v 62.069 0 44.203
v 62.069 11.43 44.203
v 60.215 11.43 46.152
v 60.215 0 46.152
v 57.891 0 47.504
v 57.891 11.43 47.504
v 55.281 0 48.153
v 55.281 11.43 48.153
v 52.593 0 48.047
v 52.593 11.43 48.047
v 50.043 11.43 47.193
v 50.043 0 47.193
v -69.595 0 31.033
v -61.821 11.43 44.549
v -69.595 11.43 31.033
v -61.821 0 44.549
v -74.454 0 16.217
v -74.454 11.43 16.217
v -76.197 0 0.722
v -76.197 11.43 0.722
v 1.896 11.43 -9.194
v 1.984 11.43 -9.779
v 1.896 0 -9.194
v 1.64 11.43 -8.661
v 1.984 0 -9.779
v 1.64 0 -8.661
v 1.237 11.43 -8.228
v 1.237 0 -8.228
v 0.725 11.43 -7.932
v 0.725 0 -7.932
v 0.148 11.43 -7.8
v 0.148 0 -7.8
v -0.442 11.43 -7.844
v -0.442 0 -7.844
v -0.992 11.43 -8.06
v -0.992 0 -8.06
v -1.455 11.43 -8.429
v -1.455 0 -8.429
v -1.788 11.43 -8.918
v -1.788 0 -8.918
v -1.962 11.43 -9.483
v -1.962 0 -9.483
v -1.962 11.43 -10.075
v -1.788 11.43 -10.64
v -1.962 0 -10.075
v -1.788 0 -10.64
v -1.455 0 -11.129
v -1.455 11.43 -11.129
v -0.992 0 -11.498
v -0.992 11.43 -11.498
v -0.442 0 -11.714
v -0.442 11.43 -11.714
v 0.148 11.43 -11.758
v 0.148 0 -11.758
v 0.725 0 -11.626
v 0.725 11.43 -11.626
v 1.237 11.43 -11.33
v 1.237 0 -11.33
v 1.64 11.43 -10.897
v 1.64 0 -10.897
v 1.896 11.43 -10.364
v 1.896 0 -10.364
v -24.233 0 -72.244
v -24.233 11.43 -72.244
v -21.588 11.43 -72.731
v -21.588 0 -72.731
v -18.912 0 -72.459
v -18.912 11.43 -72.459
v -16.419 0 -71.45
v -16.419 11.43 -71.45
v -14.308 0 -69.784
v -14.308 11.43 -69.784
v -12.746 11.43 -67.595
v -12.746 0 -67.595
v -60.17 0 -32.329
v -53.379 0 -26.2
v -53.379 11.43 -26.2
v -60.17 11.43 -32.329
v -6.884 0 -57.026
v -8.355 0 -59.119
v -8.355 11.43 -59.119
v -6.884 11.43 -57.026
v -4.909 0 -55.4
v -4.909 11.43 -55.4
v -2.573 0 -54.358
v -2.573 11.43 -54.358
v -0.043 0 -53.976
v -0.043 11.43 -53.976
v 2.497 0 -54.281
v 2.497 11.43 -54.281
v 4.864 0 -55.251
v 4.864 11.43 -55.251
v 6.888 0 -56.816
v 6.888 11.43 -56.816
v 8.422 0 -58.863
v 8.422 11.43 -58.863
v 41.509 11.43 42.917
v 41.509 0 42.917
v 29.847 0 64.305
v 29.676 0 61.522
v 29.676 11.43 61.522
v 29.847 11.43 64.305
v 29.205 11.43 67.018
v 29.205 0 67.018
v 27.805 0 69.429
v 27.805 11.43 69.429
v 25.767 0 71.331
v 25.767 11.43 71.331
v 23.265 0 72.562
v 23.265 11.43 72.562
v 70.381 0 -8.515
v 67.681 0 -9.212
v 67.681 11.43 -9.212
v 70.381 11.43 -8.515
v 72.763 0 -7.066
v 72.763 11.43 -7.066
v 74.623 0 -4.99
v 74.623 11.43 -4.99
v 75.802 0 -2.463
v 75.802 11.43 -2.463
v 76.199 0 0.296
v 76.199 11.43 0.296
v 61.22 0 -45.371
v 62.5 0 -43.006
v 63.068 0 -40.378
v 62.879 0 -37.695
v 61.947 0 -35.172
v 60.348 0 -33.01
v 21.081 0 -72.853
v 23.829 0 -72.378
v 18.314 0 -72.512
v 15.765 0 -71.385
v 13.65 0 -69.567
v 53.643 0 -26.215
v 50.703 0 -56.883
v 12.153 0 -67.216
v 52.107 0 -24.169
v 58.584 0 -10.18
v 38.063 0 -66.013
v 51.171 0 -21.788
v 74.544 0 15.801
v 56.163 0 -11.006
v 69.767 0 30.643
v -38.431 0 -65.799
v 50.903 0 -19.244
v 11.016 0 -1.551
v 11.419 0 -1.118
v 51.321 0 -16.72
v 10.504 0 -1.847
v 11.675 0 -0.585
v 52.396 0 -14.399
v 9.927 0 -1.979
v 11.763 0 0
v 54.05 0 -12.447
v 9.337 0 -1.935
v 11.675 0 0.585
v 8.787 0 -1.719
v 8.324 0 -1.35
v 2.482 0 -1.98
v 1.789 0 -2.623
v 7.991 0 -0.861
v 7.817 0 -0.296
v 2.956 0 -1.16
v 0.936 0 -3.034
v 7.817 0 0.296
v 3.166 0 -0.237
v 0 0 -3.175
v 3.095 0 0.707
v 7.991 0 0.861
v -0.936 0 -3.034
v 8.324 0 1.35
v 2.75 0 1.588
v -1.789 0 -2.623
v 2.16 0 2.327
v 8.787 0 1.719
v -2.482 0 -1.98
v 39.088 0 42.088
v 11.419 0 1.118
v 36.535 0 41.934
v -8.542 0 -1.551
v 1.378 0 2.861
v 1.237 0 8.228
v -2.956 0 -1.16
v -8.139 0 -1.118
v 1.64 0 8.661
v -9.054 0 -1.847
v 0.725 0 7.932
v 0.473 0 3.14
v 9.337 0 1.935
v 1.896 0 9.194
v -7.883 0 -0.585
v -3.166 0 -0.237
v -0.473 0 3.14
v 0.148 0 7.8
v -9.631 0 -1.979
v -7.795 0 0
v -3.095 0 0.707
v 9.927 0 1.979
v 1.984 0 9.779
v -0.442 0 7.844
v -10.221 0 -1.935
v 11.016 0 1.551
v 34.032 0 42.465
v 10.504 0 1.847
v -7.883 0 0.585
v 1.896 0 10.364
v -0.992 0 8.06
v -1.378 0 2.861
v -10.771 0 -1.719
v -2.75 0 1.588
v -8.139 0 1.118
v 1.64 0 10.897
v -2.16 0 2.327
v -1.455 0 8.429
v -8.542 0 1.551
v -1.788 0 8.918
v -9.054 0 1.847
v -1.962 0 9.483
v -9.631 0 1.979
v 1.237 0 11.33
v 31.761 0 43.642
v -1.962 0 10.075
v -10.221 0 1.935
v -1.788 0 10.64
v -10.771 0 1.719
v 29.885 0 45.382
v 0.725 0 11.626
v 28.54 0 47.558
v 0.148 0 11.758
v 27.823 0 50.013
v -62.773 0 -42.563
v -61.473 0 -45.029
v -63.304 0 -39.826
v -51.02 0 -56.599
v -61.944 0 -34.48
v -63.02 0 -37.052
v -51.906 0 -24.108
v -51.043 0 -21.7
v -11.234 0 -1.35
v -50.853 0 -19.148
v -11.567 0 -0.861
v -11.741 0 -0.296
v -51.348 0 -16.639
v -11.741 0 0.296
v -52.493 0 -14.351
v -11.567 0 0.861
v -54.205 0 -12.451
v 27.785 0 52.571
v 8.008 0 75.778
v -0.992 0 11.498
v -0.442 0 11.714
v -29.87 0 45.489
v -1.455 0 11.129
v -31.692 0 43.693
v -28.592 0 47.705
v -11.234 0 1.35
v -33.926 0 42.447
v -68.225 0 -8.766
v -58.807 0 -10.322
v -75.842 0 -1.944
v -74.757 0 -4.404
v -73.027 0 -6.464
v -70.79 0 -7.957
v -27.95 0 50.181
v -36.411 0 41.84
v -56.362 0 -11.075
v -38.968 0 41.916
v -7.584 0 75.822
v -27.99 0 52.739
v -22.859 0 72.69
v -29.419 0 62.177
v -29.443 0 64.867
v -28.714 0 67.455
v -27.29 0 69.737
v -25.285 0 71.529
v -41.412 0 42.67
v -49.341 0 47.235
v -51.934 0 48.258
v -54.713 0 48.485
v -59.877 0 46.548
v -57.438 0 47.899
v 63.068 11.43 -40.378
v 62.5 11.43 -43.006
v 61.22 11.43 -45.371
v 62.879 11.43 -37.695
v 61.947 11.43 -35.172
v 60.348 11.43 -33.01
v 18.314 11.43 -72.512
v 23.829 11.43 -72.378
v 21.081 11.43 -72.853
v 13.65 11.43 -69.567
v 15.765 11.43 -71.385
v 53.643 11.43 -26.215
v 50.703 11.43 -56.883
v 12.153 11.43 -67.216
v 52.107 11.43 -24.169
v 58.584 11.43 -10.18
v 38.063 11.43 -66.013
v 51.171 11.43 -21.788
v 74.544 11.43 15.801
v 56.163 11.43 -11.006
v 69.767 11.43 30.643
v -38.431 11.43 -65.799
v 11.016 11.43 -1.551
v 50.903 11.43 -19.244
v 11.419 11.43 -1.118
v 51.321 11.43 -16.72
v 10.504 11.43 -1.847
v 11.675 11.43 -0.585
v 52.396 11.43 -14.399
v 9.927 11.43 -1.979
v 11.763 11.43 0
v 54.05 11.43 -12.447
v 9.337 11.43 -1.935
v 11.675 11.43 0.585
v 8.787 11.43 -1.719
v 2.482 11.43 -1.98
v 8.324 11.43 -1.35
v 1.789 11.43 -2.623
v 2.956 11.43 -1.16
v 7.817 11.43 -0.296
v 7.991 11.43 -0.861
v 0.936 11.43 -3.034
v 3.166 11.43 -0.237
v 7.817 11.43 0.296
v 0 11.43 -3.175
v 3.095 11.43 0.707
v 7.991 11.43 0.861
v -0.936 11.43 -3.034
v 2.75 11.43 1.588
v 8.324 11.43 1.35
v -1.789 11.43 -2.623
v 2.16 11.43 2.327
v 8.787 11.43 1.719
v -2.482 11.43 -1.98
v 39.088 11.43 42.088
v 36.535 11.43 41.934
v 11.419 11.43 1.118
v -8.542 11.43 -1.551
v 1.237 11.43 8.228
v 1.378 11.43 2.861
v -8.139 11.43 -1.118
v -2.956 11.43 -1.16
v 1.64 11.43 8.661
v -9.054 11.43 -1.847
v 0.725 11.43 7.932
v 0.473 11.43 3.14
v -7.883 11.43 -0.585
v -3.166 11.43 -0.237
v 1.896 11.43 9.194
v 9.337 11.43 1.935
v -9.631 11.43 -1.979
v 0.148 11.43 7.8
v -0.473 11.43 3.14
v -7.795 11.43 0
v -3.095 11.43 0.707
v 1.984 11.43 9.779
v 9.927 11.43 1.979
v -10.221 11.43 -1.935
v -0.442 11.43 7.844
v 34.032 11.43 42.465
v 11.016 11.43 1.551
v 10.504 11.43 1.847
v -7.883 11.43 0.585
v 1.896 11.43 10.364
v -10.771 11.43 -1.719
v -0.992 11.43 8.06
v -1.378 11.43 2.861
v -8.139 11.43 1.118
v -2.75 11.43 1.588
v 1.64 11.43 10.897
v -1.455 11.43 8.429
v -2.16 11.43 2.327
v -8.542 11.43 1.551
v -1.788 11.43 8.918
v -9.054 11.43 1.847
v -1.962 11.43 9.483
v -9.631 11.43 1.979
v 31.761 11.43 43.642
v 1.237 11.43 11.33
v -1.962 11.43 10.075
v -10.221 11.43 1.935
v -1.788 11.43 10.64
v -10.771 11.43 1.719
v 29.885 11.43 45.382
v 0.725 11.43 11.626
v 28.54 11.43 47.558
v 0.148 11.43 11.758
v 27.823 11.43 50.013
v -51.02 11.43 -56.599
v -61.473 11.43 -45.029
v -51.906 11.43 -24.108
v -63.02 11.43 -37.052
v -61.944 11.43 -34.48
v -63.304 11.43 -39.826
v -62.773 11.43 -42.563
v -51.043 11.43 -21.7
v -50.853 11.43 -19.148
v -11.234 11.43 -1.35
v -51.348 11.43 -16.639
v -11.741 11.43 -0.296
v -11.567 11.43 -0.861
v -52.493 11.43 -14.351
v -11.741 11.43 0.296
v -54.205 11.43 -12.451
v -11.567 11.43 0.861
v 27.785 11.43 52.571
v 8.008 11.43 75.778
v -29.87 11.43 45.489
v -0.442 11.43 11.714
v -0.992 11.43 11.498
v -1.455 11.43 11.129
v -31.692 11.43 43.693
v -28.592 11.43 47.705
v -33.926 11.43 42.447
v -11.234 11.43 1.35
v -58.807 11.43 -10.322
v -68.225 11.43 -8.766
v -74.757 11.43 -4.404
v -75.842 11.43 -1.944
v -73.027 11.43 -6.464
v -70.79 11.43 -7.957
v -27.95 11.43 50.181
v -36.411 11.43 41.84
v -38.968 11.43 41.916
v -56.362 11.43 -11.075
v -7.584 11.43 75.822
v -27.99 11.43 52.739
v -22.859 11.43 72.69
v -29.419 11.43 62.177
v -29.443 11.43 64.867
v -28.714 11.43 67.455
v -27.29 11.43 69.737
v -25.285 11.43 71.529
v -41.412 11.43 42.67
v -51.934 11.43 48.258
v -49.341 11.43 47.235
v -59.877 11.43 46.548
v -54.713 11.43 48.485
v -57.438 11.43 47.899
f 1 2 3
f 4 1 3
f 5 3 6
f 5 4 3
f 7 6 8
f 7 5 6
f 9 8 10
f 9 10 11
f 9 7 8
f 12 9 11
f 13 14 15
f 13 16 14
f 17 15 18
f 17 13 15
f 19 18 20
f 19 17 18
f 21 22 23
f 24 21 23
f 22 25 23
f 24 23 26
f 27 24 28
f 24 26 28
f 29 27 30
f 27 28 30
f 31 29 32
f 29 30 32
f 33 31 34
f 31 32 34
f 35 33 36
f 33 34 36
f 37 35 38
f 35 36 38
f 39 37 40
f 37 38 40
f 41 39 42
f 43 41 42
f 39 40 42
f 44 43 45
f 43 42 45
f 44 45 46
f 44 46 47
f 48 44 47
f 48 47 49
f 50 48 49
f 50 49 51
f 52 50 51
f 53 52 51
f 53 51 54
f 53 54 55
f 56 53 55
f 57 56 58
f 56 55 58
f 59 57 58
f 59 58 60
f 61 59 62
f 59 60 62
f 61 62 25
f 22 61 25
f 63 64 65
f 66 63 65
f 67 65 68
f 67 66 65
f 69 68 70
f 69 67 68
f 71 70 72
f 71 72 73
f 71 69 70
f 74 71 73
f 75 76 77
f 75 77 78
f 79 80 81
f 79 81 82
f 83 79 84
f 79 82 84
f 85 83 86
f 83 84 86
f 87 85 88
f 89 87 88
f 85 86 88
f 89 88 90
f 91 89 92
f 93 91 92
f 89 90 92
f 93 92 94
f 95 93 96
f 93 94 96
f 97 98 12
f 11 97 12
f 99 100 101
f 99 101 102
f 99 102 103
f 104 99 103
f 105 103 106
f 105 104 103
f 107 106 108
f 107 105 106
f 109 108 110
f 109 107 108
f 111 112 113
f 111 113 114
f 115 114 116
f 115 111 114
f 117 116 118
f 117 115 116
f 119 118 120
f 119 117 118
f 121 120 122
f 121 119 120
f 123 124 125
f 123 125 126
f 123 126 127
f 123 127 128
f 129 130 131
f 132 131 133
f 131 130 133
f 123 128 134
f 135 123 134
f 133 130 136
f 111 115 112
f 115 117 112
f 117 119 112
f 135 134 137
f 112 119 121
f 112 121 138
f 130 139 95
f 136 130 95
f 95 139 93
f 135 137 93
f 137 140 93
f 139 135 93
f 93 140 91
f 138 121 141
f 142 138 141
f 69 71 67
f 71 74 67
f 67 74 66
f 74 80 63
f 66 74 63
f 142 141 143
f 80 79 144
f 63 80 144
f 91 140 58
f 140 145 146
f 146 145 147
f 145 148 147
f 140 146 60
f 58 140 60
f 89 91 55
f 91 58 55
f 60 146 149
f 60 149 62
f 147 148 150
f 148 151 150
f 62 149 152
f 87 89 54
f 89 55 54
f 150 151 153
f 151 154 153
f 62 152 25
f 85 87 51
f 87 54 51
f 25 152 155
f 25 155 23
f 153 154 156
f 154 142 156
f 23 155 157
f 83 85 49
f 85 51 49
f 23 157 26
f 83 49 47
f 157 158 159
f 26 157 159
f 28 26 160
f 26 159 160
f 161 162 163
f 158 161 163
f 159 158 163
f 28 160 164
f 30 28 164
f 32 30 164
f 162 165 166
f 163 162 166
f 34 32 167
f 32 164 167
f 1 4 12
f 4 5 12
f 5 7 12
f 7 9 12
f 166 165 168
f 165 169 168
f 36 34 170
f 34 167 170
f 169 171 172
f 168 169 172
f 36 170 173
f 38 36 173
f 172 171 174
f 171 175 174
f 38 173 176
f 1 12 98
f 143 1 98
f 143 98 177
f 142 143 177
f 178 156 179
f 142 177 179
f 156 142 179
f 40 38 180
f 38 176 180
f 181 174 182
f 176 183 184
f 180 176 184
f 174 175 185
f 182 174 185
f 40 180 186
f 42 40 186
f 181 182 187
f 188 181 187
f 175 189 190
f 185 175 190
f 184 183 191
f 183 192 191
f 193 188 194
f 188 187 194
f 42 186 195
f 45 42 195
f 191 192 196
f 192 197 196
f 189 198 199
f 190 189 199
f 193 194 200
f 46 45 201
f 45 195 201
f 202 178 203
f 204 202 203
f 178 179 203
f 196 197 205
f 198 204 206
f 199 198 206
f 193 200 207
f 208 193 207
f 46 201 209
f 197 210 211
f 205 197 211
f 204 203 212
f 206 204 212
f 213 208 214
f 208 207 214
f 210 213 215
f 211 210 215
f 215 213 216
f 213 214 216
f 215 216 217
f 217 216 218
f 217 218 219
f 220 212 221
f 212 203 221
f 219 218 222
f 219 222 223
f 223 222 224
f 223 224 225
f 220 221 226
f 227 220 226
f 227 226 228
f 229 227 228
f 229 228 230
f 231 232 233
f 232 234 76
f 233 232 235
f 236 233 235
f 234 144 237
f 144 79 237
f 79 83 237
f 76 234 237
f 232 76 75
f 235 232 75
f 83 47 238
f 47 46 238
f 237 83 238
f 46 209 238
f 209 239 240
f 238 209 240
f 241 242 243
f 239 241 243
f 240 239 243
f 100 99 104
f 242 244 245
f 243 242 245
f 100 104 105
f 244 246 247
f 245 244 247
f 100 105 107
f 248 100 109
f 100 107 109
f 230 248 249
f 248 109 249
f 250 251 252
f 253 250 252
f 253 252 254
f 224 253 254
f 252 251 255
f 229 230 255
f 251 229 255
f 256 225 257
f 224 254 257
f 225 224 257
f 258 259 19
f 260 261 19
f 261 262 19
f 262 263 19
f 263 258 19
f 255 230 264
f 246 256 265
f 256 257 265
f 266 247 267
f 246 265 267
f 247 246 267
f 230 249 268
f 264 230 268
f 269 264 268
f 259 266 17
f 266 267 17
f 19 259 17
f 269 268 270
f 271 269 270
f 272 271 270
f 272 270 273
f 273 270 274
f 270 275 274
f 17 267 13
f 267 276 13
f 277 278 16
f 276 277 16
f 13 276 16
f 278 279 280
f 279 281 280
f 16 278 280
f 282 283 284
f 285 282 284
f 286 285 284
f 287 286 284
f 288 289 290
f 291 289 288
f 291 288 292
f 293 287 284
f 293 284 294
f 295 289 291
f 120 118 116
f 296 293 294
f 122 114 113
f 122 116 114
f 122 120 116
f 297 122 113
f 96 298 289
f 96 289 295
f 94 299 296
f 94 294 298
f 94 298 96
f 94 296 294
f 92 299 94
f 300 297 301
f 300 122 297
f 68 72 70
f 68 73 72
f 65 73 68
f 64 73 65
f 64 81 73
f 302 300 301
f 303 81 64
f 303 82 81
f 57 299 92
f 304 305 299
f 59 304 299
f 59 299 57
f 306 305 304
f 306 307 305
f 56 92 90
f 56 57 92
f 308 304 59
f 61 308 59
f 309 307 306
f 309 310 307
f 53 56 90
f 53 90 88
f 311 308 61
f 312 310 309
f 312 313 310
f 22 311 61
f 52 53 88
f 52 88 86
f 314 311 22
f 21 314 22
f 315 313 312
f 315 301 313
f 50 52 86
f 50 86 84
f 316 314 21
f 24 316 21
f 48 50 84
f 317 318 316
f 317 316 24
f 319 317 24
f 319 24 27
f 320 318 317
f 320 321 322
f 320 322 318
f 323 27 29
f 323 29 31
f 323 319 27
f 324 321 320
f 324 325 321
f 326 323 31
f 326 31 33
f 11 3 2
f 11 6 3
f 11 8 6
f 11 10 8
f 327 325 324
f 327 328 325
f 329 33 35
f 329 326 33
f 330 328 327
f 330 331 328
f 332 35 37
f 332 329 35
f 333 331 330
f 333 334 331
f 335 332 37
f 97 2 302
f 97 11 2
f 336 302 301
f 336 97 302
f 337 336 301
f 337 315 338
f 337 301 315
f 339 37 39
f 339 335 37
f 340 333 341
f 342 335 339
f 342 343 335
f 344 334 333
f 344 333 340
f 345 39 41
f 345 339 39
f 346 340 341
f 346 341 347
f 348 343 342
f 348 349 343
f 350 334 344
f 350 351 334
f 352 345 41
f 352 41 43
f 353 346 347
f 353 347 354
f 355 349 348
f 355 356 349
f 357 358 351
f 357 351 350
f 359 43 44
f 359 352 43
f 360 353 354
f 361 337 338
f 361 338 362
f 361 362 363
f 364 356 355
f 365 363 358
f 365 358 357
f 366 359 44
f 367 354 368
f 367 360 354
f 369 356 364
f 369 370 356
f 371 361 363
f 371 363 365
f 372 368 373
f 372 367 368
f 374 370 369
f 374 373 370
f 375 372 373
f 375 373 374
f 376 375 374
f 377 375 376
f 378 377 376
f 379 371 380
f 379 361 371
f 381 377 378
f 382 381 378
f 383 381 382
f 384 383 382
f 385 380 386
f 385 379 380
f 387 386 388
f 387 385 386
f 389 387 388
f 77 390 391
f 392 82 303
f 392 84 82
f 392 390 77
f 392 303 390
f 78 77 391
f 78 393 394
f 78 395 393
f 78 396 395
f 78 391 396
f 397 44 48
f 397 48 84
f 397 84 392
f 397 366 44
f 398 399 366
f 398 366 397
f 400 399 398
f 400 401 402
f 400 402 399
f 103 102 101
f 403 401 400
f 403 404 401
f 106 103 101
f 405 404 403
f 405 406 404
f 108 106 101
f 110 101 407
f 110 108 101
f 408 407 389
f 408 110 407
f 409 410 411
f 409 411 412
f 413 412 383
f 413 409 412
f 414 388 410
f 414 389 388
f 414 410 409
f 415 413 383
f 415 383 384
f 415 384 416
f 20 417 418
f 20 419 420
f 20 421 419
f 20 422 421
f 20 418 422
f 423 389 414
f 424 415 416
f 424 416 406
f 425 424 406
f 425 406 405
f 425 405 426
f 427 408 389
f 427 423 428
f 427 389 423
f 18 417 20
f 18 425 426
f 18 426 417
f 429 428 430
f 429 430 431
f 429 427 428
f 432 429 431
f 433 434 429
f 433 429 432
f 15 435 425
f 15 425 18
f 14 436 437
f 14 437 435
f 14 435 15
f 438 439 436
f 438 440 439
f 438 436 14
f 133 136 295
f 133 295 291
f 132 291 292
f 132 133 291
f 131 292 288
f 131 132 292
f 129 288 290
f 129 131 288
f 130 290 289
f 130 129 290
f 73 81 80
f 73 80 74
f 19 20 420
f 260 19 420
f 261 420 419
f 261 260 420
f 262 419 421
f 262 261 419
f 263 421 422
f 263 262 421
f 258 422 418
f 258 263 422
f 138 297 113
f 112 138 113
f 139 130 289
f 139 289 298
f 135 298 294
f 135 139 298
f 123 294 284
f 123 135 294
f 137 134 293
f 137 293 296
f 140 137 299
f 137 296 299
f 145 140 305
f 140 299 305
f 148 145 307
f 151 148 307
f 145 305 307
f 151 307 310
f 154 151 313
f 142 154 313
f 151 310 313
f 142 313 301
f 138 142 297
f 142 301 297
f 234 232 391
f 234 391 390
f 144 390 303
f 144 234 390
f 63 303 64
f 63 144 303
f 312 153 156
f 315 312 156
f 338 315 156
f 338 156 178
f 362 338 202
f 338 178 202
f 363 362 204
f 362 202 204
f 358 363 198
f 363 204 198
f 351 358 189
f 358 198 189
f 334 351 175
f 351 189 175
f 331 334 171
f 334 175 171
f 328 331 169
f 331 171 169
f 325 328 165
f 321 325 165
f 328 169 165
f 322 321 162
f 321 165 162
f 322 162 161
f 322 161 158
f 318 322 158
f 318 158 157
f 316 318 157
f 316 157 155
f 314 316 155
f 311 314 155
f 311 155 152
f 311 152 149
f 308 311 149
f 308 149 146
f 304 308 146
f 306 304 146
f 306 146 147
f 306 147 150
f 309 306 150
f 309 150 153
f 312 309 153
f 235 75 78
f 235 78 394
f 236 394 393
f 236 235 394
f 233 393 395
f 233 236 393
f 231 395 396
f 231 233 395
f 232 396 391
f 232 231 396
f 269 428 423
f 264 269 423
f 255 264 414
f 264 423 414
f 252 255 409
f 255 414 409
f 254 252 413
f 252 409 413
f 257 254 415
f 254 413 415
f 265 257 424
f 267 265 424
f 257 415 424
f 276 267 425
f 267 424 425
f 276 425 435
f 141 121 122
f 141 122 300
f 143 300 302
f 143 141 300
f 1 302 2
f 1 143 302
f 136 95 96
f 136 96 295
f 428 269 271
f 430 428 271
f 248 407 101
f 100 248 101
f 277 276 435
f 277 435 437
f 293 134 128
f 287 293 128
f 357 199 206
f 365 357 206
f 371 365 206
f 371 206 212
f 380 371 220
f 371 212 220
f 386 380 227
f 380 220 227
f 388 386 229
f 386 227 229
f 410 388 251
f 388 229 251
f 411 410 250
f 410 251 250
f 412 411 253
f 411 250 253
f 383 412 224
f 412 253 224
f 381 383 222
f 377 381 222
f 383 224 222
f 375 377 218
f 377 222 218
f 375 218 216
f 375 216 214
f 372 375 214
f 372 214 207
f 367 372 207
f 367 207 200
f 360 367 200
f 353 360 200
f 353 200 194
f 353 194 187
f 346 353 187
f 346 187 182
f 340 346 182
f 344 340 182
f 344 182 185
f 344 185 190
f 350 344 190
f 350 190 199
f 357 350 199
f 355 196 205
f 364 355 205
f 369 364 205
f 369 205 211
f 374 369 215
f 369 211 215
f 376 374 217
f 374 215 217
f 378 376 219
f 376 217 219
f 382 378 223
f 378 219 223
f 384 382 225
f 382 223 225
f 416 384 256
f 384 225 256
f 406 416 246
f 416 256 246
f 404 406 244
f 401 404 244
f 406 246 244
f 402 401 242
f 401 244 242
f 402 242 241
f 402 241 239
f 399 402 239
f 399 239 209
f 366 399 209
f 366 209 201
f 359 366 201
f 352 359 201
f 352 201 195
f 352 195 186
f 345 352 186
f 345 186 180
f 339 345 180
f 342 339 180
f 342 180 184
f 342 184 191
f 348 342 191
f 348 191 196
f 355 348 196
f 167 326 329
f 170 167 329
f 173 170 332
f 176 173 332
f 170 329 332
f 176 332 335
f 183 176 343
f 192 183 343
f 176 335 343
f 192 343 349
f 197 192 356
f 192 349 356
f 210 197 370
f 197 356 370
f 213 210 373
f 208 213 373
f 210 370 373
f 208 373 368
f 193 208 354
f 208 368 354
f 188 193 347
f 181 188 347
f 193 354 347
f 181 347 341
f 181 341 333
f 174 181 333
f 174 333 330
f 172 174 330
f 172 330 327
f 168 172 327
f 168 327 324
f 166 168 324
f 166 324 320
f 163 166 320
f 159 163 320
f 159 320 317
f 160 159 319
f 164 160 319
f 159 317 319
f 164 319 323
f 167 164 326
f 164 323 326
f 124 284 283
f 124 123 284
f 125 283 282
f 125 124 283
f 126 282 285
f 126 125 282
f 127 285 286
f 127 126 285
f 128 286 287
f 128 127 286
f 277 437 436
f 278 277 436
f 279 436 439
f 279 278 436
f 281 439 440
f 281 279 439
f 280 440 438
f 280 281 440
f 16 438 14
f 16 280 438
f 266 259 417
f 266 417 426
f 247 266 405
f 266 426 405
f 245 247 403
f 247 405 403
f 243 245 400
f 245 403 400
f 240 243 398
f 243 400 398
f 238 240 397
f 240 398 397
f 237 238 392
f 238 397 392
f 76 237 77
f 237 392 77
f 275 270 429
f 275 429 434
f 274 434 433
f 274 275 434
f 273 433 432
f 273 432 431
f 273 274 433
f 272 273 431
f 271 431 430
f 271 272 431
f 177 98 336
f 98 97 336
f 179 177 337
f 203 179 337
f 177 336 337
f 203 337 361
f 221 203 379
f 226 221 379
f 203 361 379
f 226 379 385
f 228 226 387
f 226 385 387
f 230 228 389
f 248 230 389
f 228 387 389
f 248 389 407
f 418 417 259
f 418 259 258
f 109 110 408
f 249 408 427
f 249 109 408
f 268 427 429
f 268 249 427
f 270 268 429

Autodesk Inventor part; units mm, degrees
ref_plane "YZ Plane" through (0, 0, 0) normal (1, 0, 0) x (0, 1, 0)
ref_plane "XZ Plane" through (0, 0, 0) normal (0, 1, 0) x (-1, 0, 0)
ref_plane "XY Plane" through (0, 0, 0) normal (0, 0, 1) x (1, 0, 0)
sketch "Sketch1" plane through (0, 0, 0) normal (0, 1, 0) x (-1, 0, 0)
  circle A0 centre (0, 0) radius 76.2
  dimension "d0" = 152.4
extrude "Extrusion1" add sketch "Sketch1" along normal blind 11.43
sketch "Sketch2" plane through (0, 11.43, 0) normal (0, 1, 0) x (1, 0, 0)
  circle A0 centre (0, 0) radius 76.2 projected
  line L0 (0.1023, 76.1999) -> (0.1023, 63.4999) construction
  arc A1 (-8.3552, 59.1187) -> (8.4222, 58.8626) centre (0.1023, 63.4999) ccw
  line L1 (8.4222, 58.8626) -> (15.4584, 74.6155)
  line L2 (-8.3552, 59.1187) -> (-16.2911, 74.4382)
  dimension "d3" = 12.7
  dimension "d4" = 19.05
  dimension "d16" = 31.75
extrude "Extrusion2" cut sketch "Sketch2" against normal through all contours L1 A1 L2 A0 picked at (1.6562, 64.6745)
fillet "Fillet1" radius 9.525 1 edges at (-16.2911, 5.715, -74.4382)
fillet "Fillet2" radius 9.525 1 edges at (15.4584, 5.715, -74.6155)
pattern_circular "Circular Pattern1" count 5 over 360 about axis through (0, -10, 0) along (0, 1, 0) of "Extrusion2", "Fillet1", "Fillet2"
sketch "Sketch4" plane through (0, 0, 0) normal (0, -1, 0) x (1, 0, 0)
  circle A0 centre (0, 0) radius 3.175
  dimension "d19" = 6.35
hole "Hole1" at (0, 0, 0) direction (0, 1, 0) diameter 6.35 end through all
sketch "Sketch5" plane through (0, 0, 0) normal (0, -1, 0) x (1, 0, 0)
  circle A0 centre (0, -9.779) radius 1.9844
  circle A1 centre (0, 0) radius 3.175 projected
  arc A2 (67.6814, -9.2124) -> (76.1994, 0.2962) centre (66.6745, 0.2592) ccw projected
  arc A3 (76.1994, 0.2962) -> (62.0688, 44.203) centre (0, 0) ccw projected
  arc A4 (62.0688, 44.203) -> (50.0431, 47.1934) centre (54.3102, 38.6777) ccw projected
  line L0 (50.0431, 47.1934) -> (41.5086, 42.9169) projected
  arc A5 (27.7848, 52.5712) -> (41.5086, 42.9169) centre (37.2415, 51.4327) ccw projected
  line L1 (27.7848, 52.5712) -> (29.6763, 61.522) projected
  arc A6 (29.6763, 61.522) -> (23.2652, 72.5615) centre (20.357, 63.4913) ccw projected
  arc A7 (23.2652, 72.5615) -> (-22.8593, 72.6904) centre (0, 0) ccw projected
  arc A8 (-22.8593, 72.6904) -> (-29.4194, 62.1774) centre (-20.0019, 63.6041) ccw projected
  line L2 (-29.4194, 62.1774) -> (-27.9896, 52.7391) projected
  arc A9 (-41.4122, 42.6704) -> (-27.9896, 52.7391) centre (-37.4071, 51.3124) ccw projected
  line L3 (-41.4122, 42.6704) -> (-49.3405, 47.2352) projected
  arc A10 (-49.3405, 47.2352) -> (-61.8207, 44.5493) centre (-54.0931, 38.9806) ccw projected
  arc A11 (-61.8207, 44.5493) -> (-76.1966, 0.7221) centre (0, 0) ccw projected
  arc A12 (-76.1966, 0.7221) -> (-68.2253, -8.7657) centre (-66.672, 0.6318) ccw projected
  line L4 (-68.2253, -8.7657) -> (-58.8071, -10.3224) projected
  arc A13 (-53.379, -26.1995) -> (-58.8071, -10.3224) centre (-60.3604, -19.7199) ccw projected
  line L5 (-53.379, -26.1995) -> (-60.1703, -32.3291) projected
  arc A14 (-60.1703, -32.3291) -> (-61.4725, -45.0285) centre (-53.7885, -39.4) ccw projected
  arc A15 (-61.4725, -45.0285) -> (-24.2328, -72.2441) centre (0, 0) ccw projected
  arc A16 (-24.2328, -72.2441) -> (-12.7461, -67.5948) centre (-21.2037, -63.2136) ccw projected
  line L6 (-12.7461, -67.5948) -> (-8.3552, -59.1187) projected
  arc A17 (8.4222, -58.8626) -> (-8.3552, -59.1187) centre (0.1023, -63.4999) ccw projected
  line L7 (8.4222, -58.8626) -> (12.1532, -67.2156) projected
  arc A18 (12.1532, -67.2156) -> (23.8286, -72.3784) centre (20.8501, -63.3311) ccw projected
  arc A19 (23.8286, -72.3784) -> (61.2199, -45.3714) centre (0, 0) ccw projected
  arc A20 (61.2199, -45.3714) -> (60.3477, -33.0102) centre (53.5674, -39.7) ccw projected
  line L8 (60.3477, -33.0102) -> (53.6433, -26.215) projected
  arc A21 (58.5842, -10.1795) -> (53.6433, -26.215) centre (60.4236, -19.5253) ccw projected
  line L9 (58.5842, -10.1795) -> (67.6814, -9.2124) projected
  circle A22 centre (0, 0) radius 3.175 projected
  circle A23 centre (0, 0) radius 3.175 projected
  circle A24 centre (0, 0) radius 3.175 projected
  circle A25 centre (9.779, 0) radius 1.9844
  circle A26 centre (0, 9.779) radius 1.9844
  circle A27 centre (-9.779, 0) radius 1.9844
  dimension "d27" = 9.779
  dimension "d28" = 3.9688
  dimension "d31" = 360
extrude "Extrusion3" cut sketch "Sketch5" against normal blind 12.7 contours A0 | A25 | A26 | A27
properties part number "gear wheel"
